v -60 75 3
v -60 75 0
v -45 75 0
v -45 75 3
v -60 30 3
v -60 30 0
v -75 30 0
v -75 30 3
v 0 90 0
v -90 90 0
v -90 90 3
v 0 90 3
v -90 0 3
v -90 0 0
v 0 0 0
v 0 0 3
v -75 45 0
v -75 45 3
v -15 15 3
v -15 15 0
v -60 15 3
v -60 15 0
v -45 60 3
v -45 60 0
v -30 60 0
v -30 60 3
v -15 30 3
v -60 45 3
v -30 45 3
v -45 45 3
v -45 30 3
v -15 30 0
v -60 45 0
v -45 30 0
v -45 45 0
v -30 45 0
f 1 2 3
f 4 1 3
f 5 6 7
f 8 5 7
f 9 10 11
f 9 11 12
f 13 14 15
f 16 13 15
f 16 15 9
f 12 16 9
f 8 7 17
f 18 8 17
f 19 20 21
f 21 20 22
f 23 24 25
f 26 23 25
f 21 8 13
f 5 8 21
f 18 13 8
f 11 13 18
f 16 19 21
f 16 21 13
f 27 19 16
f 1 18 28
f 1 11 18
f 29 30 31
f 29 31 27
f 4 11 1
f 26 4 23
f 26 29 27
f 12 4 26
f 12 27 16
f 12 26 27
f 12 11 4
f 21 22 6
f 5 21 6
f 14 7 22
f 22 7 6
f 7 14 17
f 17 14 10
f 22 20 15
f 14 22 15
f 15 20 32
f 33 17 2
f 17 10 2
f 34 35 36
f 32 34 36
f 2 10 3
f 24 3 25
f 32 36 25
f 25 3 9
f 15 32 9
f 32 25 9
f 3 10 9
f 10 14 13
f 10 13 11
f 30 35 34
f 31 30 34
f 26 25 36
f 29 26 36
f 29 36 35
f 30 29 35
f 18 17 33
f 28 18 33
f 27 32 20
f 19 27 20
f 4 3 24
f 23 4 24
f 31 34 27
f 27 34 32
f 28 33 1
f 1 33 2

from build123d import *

# Parameters (mm, degrees)
SKETCH_W     = 90
SKETCH_H     = 90
PAD_DEPTH    = 3
POCKET_DEPTH = 3


with BuildPart() as part:
    # Sketch → Pad (new body)
    with BuildSketch(Plane.XY):
        with Locations((-45, 45)):
            Rectangle(SKETCH_W, SKETCH_H)
    extrude(amount=PAD_DEPTH)

    # Sketch001 (on Face5 of Pad) → Pocket (cut)
    with BuildSketch(Plane(origin=(0, 0, 0), x_dir=(1, 0, 0), z_dir=(0, 0, -1))):
        Polygon((-60, -15), (-60, -30), (-75, -30), (-75, -45), (-60, -45), (-60, -75), (-45, -75), (-45, -60), (-30, -60), (-30, -45), (-45, -45), (-45, -30), (-15, -30), (-15, -15), align=None)
    extrude(amount=-POCKET_DEPTH, mode=Mode.SUBTRACT)


solid = part.part
